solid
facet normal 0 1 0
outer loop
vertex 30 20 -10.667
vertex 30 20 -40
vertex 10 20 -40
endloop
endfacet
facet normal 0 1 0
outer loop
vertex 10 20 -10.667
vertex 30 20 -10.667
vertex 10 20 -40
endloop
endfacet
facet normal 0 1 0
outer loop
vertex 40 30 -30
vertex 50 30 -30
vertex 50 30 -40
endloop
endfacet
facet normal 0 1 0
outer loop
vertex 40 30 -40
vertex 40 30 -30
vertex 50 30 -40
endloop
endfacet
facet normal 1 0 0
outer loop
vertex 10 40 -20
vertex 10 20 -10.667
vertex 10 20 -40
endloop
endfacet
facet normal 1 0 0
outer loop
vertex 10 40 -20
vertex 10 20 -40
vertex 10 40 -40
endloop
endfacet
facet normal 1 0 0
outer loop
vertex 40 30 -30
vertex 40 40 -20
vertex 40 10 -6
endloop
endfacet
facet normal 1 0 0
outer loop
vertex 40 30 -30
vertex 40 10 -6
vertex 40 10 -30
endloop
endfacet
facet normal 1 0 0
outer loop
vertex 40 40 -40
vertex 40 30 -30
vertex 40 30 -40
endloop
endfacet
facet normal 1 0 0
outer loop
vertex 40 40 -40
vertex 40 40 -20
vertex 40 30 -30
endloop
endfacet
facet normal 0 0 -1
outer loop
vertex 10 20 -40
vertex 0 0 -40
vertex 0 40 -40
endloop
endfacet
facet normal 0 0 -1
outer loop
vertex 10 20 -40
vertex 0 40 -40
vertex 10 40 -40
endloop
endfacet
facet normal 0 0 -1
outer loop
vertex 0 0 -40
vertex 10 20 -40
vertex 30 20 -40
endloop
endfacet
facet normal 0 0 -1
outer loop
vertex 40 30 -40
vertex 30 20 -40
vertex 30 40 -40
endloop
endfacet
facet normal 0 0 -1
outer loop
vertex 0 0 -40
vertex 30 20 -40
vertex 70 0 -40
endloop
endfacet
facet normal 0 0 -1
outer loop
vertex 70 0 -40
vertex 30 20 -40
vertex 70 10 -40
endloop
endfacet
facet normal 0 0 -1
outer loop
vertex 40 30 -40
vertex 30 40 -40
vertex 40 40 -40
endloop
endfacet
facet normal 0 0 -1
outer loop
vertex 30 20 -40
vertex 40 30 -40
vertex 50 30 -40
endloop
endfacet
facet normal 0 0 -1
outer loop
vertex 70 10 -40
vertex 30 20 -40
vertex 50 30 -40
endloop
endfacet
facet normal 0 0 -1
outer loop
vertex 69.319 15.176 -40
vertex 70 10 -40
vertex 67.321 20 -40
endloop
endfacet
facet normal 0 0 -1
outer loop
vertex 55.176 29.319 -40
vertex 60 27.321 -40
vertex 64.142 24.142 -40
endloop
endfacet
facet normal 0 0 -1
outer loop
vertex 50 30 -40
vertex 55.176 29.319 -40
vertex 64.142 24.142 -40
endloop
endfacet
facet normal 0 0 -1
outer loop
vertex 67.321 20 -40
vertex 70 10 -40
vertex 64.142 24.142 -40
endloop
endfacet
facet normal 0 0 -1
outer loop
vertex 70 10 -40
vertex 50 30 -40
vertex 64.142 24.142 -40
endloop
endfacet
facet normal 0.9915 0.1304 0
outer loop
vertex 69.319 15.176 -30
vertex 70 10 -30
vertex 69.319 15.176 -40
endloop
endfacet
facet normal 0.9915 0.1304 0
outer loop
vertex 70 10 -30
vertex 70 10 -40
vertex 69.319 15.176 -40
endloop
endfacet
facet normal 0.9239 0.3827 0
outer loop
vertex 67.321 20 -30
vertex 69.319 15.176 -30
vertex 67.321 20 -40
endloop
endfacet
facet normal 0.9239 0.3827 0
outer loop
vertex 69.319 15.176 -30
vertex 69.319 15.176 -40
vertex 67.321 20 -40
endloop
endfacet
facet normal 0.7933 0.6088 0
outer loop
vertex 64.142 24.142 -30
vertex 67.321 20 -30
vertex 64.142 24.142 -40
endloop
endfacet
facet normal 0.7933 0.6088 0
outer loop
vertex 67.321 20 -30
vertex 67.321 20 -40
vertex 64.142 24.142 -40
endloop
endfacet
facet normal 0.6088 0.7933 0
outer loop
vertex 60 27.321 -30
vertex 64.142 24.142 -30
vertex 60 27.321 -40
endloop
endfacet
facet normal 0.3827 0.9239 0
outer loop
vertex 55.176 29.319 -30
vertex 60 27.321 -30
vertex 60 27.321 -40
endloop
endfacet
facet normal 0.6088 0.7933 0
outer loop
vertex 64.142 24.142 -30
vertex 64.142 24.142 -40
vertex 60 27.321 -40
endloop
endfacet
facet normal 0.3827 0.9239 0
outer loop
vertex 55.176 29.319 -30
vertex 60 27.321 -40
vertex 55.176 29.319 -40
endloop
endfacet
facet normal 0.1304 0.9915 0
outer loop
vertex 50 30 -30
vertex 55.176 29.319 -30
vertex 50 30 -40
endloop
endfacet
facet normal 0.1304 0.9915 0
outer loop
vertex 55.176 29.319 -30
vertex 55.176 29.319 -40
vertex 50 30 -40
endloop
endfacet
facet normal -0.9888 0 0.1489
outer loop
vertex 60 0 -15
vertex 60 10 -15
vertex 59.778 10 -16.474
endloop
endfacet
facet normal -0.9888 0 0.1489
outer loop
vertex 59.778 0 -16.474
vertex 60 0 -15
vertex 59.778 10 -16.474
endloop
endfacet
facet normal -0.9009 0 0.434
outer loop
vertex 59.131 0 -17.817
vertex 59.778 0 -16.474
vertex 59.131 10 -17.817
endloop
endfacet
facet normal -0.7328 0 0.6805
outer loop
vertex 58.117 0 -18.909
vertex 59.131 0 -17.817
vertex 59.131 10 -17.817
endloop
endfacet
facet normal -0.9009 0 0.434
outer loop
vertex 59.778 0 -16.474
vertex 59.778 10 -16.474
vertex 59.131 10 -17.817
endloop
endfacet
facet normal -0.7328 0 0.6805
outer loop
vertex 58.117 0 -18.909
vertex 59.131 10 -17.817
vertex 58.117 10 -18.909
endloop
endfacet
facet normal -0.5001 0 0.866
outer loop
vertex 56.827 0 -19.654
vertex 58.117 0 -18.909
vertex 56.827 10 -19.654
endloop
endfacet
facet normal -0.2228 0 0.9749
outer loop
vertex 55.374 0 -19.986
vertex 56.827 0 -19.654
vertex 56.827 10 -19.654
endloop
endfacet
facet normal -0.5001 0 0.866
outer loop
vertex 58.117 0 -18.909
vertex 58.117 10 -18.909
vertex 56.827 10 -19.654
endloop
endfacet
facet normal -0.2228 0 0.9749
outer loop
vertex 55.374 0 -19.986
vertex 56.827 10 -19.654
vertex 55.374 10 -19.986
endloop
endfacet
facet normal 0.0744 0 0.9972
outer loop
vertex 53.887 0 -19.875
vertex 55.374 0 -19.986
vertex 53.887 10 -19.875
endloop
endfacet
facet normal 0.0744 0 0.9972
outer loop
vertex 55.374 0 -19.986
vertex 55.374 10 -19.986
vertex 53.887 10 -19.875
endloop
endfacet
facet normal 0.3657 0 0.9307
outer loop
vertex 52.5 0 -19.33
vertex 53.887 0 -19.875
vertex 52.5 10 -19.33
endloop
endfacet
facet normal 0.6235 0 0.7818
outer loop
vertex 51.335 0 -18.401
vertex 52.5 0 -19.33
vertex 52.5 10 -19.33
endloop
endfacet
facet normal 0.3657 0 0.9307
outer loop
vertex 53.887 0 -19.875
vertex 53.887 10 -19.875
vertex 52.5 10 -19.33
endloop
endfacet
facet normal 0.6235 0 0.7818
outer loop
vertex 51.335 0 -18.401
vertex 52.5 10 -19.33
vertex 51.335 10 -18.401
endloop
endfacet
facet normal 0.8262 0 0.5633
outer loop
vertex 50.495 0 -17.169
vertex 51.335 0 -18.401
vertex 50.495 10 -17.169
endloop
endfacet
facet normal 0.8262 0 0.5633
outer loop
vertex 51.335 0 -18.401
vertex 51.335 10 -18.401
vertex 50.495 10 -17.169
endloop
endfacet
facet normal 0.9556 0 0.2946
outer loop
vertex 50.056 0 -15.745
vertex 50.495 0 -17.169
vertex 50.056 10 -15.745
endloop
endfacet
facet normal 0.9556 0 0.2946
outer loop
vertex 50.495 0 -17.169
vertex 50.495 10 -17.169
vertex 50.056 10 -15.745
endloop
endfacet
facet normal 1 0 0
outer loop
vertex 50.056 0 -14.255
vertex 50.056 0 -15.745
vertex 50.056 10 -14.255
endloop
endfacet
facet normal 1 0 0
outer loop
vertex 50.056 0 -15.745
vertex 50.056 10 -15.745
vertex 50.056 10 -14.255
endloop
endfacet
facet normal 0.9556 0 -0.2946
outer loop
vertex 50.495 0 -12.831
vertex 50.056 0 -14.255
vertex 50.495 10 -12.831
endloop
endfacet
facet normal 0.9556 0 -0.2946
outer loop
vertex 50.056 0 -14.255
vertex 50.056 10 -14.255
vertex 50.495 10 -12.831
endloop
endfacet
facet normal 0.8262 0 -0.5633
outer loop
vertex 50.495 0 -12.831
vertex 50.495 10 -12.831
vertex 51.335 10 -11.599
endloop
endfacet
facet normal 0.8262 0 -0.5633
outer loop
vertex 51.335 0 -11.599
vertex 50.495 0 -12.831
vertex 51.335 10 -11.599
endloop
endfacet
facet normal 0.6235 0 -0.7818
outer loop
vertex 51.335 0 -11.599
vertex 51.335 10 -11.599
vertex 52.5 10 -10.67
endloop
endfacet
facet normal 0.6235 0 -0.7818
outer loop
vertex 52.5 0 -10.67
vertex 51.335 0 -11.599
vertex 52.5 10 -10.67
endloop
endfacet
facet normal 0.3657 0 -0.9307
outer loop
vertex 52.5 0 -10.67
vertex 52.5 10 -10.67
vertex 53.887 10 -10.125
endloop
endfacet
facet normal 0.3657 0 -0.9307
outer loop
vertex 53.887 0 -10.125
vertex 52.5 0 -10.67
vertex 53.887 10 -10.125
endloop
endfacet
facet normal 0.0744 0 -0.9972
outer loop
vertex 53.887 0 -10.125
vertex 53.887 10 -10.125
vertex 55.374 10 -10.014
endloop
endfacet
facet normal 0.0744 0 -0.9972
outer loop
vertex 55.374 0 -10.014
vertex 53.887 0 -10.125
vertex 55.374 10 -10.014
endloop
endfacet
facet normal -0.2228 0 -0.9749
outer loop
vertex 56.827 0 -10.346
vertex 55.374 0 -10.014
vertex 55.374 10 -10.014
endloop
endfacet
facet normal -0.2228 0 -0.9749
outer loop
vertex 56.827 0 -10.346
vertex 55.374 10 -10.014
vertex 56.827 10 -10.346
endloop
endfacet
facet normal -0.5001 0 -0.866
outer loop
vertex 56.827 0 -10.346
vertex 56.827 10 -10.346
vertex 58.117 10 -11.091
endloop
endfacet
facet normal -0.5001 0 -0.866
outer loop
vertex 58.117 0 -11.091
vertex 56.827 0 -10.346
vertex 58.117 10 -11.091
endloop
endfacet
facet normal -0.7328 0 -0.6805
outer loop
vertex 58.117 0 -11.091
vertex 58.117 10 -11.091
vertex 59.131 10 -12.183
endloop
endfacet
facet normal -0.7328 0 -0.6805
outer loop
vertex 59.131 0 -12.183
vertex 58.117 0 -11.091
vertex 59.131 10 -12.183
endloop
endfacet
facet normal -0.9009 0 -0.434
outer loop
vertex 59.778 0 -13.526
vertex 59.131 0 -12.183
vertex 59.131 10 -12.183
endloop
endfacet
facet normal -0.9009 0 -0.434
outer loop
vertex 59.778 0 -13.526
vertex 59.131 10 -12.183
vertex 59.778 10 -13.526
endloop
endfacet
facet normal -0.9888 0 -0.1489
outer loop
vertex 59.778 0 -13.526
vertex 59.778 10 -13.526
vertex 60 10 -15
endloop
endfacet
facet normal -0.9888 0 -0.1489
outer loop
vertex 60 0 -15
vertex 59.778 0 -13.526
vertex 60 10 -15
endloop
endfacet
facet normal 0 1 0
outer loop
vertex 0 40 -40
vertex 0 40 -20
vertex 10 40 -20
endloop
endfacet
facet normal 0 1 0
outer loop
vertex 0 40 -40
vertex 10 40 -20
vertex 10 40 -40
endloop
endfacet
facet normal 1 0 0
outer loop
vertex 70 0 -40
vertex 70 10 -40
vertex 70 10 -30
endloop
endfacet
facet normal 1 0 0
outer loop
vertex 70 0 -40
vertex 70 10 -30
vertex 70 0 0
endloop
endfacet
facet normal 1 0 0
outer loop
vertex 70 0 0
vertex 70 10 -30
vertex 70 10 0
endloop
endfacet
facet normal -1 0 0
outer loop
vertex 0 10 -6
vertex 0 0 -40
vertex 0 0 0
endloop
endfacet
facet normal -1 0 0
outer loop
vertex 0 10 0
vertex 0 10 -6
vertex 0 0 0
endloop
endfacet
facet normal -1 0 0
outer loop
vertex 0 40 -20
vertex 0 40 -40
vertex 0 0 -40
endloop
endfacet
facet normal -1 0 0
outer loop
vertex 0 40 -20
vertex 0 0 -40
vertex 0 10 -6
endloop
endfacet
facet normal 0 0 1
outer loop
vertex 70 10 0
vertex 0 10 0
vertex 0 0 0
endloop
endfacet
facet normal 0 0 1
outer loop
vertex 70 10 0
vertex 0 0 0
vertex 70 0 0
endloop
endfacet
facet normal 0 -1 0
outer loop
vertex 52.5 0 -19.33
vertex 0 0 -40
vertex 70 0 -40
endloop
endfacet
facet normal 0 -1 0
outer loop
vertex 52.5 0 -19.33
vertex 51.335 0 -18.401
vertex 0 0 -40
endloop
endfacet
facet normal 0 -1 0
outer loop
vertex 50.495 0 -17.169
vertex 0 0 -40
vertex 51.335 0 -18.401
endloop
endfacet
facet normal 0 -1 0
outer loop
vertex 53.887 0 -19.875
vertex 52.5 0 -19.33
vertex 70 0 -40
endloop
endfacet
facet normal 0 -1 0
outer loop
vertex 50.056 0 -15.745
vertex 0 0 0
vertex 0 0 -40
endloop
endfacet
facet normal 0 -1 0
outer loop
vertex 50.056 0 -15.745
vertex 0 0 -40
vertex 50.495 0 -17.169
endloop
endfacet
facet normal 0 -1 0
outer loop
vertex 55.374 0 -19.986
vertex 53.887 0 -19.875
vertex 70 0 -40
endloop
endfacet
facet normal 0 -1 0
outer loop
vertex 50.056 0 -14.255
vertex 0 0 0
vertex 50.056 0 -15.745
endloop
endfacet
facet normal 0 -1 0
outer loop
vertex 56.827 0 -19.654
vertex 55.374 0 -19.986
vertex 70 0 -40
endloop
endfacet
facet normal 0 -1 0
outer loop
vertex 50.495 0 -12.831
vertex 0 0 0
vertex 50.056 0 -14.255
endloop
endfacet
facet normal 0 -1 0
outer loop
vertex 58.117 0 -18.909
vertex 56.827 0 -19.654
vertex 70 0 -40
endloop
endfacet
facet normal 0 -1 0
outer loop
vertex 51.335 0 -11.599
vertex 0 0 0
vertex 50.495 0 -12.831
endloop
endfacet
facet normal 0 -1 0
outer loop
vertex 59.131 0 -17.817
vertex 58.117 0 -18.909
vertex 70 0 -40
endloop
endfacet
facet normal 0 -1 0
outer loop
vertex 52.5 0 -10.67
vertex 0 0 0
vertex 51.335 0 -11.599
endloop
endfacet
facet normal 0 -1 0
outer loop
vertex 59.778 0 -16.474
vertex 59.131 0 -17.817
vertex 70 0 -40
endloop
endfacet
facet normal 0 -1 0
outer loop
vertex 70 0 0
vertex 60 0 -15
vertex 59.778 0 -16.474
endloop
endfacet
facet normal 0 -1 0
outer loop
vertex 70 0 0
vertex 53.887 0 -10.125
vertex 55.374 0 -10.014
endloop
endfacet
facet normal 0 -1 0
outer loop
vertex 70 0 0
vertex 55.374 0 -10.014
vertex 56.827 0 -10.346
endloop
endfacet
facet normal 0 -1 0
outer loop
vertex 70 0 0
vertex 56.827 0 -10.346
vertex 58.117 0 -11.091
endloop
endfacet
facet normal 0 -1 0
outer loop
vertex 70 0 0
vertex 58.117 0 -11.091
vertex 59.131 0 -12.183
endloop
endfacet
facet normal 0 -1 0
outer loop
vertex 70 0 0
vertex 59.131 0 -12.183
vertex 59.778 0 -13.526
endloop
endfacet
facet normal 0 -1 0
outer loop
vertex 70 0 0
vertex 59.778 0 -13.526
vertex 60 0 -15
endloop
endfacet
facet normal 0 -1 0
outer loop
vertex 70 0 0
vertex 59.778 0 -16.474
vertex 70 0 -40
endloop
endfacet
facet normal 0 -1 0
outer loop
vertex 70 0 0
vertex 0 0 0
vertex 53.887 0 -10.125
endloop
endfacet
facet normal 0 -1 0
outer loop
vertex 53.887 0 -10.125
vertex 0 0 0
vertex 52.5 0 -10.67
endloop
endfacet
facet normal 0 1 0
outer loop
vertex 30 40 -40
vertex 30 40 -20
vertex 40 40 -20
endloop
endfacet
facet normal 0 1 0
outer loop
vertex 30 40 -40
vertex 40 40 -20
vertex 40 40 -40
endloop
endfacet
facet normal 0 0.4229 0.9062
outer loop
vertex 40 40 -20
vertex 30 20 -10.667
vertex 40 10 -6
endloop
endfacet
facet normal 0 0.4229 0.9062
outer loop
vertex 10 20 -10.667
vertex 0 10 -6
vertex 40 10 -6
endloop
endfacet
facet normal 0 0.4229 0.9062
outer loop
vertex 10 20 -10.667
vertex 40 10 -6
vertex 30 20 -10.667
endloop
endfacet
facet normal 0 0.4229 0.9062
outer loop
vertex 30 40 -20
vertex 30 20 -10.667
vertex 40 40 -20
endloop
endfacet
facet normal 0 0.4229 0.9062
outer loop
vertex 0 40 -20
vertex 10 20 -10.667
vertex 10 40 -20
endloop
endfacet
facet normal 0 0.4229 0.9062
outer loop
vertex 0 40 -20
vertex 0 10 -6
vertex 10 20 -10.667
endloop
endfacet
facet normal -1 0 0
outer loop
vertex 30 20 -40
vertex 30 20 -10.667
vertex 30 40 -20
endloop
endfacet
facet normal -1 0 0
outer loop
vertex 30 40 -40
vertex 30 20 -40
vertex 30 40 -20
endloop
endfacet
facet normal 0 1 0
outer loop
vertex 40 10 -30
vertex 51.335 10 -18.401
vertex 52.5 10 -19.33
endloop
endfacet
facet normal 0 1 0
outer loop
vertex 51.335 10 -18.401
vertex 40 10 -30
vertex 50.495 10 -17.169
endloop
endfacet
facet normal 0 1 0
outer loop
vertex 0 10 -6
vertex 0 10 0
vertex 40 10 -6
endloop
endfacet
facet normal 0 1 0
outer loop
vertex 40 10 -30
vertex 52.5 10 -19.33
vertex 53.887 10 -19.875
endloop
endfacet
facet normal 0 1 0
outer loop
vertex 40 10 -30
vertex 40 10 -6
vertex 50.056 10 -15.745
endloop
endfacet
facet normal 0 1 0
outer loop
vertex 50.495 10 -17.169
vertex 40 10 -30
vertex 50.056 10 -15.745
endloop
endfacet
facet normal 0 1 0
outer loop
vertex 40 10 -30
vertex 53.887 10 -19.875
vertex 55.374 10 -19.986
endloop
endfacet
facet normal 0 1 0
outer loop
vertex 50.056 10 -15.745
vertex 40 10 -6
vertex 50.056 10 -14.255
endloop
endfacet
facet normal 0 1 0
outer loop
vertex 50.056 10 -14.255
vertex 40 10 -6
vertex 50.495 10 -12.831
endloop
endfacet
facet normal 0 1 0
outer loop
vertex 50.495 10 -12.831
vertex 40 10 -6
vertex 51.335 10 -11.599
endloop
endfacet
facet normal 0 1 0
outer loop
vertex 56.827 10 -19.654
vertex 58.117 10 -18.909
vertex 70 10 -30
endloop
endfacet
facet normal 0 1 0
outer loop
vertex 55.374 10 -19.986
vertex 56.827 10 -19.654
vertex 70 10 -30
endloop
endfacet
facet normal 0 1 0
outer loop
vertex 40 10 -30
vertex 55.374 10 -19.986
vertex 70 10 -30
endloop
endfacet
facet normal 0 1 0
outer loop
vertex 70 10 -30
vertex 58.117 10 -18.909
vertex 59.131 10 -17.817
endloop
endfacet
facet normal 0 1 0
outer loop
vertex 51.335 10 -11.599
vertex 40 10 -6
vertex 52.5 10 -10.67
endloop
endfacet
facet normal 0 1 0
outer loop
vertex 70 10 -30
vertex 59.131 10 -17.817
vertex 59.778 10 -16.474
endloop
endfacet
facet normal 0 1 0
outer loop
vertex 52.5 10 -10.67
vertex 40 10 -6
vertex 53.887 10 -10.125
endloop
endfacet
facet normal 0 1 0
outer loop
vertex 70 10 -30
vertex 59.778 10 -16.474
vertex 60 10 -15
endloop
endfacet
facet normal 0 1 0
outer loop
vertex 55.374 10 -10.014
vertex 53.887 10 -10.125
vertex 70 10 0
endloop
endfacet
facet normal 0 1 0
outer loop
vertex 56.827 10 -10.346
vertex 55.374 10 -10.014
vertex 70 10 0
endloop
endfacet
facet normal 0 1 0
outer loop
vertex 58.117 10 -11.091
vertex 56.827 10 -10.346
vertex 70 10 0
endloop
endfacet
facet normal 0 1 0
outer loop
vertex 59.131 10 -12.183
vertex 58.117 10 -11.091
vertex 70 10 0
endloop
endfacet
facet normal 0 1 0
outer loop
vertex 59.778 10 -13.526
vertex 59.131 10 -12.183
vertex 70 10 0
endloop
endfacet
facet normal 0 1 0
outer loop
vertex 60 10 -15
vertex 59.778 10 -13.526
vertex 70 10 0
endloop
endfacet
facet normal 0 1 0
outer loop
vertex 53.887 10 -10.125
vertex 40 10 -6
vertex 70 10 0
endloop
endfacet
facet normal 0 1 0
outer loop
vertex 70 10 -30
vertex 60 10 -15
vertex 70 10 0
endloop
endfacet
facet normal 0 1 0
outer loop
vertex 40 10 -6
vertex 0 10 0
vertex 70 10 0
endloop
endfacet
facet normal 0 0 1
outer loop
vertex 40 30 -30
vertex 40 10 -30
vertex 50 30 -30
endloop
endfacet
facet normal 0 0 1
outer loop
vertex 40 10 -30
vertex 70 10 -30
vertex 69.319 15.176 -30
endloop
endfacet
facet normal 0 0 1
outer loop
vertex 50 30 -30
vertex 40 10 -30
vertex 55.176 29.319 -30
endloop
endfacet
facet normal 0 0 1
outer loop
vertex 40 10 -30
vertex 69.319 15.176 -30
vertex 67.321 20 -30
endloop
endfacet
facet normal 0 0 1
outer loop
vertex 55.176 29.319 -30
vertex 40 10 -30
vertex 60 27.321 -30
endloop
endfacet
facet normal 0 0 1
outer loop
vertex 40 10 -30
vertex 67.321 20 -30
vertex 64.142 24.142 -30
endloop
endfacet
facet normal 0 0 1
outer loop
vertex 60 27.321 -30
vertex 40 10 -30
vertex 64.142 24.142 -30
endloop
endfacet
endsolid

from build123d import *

# Parameters (mm, degrees)
BOSS_EXTRUDE1_DEPTH            = 40
SKETCH2_W                      = 40
SKETCH2_H                      = 30
BOSS_EXTRUDE2_DEPTH            = 20
BOSS_EXTRUDE3_DEPTH            = 30
CUT_EXTRUDE1_DEPTH             = 30
SKETCH5_W                      = 70
SKETCH5_H                      = 40
BOSS_EXTRUDE4_DEPTH            = 10
SKETCH6_W                      = 20
SKETCH6_H                      = 20
CUT_EXTRUDE2_DEPTH             = 41
F_10_0_10_DIAMETER_HOLE1_D     = 10
F_10_0_10_DIAMETER_HOLE1_DEPTH = 40
FILLET1_R                      = 20


with BuildPart() as part:
    # Sketch1 → Boss-Extrude1 (new body)
    with BuildSketch(Plane(origin=(0, 0, 0), x_dir=(0, -1, 0), z_dir=(-1, 0, 0))):
        Polygon((-10, -6), (-40, -20), (-10, -20), align=None)
    extrude(amount=-BOSS_EXTRUDE1_DEPTH)

    # Sketch2 → Boss-Extrude2 (add)
    with BuildSketch(Plane(origin=(0, 0, -20), x_dir=(-1, 0, 0), z_dir=(0, 0, -1))):
        with Locations((-20, 25)):
            Rectangle(SKETCH2_W, SKETCH2_H)
    extrude(amount=BOSS_EXTRUDE2_DEPTH)

    # Sketch3 → Boss-Extrude3 (add)
    with BuildSketch(Plane(origin=(40, 0, 0), x_dir=(0, 0, -1), z_dir=(1, 0, 0))):
        Polygon((40, 10), (0, 10), (20, 40), (40, 40), align=None)
    extrude(amount=BOSS_EXTRUDE3_DEPTH)

    # Sketch4 → Cut-Extrude1 (cut)
    with BuildSketch(Plane(origin=(70, 0, 0), x_dir=(0, 0, -1), z_dir=(1, 0, 0))):
        Polygon((20, 40), (0, 10), (30, 10), (30, 30), (40, 30), (40, 40), align=None)
    extrude(amount=-CUT_EXTRUDE1_DEPTH, mode=Mode.SUBTRACT)

    # Sketch5 → Boss-Extrude4 (add)
    with BuildSketch(Plane.XZ.offset(-10)):
        with Locations((35, -20)):
            Rectangle(SKETCH5_W, SKETCH5_H)
    extrude(amount=BOSS_EXTRUDE4_DEPTH)

    # Sketch6 → Cut-Extrude2 (cut, through all)
    with BuildSketch(Plane(origin=(0, 0, -40), x_dir=(-1, 0, 0), z_dir=(0, 0, -1))):
        with Locations((-20, 30)):
            Rectangle(SKETCH6_W, SKETCH6_H)
    extrude(amount=-CUT_EXTRUDE2_DEPTH, mode=Mode.SUBTRACT)

    # Ø10.0 (10) Diameter Hole1
    with Locations(Plane(origin=(0, 0, 0), x_dir=(-1, 0, 0), z_dir=(0, -1, 0))):
        with Locations((-55, 15)):
            Hole(F_10_0_10_DIAMETER_HOLE1_D / 2, depth=F_10_0_10_DIAMETER_HOLE1_DEPTH)

    # Fillet1
    fillet1_edges = [part.edges().sort_by_distance(p)[0] for p in [
        (70, 30, -35),
    ]]
    fillet(fillet1_edges, radius=FILLET1_R)


solid = part.part
